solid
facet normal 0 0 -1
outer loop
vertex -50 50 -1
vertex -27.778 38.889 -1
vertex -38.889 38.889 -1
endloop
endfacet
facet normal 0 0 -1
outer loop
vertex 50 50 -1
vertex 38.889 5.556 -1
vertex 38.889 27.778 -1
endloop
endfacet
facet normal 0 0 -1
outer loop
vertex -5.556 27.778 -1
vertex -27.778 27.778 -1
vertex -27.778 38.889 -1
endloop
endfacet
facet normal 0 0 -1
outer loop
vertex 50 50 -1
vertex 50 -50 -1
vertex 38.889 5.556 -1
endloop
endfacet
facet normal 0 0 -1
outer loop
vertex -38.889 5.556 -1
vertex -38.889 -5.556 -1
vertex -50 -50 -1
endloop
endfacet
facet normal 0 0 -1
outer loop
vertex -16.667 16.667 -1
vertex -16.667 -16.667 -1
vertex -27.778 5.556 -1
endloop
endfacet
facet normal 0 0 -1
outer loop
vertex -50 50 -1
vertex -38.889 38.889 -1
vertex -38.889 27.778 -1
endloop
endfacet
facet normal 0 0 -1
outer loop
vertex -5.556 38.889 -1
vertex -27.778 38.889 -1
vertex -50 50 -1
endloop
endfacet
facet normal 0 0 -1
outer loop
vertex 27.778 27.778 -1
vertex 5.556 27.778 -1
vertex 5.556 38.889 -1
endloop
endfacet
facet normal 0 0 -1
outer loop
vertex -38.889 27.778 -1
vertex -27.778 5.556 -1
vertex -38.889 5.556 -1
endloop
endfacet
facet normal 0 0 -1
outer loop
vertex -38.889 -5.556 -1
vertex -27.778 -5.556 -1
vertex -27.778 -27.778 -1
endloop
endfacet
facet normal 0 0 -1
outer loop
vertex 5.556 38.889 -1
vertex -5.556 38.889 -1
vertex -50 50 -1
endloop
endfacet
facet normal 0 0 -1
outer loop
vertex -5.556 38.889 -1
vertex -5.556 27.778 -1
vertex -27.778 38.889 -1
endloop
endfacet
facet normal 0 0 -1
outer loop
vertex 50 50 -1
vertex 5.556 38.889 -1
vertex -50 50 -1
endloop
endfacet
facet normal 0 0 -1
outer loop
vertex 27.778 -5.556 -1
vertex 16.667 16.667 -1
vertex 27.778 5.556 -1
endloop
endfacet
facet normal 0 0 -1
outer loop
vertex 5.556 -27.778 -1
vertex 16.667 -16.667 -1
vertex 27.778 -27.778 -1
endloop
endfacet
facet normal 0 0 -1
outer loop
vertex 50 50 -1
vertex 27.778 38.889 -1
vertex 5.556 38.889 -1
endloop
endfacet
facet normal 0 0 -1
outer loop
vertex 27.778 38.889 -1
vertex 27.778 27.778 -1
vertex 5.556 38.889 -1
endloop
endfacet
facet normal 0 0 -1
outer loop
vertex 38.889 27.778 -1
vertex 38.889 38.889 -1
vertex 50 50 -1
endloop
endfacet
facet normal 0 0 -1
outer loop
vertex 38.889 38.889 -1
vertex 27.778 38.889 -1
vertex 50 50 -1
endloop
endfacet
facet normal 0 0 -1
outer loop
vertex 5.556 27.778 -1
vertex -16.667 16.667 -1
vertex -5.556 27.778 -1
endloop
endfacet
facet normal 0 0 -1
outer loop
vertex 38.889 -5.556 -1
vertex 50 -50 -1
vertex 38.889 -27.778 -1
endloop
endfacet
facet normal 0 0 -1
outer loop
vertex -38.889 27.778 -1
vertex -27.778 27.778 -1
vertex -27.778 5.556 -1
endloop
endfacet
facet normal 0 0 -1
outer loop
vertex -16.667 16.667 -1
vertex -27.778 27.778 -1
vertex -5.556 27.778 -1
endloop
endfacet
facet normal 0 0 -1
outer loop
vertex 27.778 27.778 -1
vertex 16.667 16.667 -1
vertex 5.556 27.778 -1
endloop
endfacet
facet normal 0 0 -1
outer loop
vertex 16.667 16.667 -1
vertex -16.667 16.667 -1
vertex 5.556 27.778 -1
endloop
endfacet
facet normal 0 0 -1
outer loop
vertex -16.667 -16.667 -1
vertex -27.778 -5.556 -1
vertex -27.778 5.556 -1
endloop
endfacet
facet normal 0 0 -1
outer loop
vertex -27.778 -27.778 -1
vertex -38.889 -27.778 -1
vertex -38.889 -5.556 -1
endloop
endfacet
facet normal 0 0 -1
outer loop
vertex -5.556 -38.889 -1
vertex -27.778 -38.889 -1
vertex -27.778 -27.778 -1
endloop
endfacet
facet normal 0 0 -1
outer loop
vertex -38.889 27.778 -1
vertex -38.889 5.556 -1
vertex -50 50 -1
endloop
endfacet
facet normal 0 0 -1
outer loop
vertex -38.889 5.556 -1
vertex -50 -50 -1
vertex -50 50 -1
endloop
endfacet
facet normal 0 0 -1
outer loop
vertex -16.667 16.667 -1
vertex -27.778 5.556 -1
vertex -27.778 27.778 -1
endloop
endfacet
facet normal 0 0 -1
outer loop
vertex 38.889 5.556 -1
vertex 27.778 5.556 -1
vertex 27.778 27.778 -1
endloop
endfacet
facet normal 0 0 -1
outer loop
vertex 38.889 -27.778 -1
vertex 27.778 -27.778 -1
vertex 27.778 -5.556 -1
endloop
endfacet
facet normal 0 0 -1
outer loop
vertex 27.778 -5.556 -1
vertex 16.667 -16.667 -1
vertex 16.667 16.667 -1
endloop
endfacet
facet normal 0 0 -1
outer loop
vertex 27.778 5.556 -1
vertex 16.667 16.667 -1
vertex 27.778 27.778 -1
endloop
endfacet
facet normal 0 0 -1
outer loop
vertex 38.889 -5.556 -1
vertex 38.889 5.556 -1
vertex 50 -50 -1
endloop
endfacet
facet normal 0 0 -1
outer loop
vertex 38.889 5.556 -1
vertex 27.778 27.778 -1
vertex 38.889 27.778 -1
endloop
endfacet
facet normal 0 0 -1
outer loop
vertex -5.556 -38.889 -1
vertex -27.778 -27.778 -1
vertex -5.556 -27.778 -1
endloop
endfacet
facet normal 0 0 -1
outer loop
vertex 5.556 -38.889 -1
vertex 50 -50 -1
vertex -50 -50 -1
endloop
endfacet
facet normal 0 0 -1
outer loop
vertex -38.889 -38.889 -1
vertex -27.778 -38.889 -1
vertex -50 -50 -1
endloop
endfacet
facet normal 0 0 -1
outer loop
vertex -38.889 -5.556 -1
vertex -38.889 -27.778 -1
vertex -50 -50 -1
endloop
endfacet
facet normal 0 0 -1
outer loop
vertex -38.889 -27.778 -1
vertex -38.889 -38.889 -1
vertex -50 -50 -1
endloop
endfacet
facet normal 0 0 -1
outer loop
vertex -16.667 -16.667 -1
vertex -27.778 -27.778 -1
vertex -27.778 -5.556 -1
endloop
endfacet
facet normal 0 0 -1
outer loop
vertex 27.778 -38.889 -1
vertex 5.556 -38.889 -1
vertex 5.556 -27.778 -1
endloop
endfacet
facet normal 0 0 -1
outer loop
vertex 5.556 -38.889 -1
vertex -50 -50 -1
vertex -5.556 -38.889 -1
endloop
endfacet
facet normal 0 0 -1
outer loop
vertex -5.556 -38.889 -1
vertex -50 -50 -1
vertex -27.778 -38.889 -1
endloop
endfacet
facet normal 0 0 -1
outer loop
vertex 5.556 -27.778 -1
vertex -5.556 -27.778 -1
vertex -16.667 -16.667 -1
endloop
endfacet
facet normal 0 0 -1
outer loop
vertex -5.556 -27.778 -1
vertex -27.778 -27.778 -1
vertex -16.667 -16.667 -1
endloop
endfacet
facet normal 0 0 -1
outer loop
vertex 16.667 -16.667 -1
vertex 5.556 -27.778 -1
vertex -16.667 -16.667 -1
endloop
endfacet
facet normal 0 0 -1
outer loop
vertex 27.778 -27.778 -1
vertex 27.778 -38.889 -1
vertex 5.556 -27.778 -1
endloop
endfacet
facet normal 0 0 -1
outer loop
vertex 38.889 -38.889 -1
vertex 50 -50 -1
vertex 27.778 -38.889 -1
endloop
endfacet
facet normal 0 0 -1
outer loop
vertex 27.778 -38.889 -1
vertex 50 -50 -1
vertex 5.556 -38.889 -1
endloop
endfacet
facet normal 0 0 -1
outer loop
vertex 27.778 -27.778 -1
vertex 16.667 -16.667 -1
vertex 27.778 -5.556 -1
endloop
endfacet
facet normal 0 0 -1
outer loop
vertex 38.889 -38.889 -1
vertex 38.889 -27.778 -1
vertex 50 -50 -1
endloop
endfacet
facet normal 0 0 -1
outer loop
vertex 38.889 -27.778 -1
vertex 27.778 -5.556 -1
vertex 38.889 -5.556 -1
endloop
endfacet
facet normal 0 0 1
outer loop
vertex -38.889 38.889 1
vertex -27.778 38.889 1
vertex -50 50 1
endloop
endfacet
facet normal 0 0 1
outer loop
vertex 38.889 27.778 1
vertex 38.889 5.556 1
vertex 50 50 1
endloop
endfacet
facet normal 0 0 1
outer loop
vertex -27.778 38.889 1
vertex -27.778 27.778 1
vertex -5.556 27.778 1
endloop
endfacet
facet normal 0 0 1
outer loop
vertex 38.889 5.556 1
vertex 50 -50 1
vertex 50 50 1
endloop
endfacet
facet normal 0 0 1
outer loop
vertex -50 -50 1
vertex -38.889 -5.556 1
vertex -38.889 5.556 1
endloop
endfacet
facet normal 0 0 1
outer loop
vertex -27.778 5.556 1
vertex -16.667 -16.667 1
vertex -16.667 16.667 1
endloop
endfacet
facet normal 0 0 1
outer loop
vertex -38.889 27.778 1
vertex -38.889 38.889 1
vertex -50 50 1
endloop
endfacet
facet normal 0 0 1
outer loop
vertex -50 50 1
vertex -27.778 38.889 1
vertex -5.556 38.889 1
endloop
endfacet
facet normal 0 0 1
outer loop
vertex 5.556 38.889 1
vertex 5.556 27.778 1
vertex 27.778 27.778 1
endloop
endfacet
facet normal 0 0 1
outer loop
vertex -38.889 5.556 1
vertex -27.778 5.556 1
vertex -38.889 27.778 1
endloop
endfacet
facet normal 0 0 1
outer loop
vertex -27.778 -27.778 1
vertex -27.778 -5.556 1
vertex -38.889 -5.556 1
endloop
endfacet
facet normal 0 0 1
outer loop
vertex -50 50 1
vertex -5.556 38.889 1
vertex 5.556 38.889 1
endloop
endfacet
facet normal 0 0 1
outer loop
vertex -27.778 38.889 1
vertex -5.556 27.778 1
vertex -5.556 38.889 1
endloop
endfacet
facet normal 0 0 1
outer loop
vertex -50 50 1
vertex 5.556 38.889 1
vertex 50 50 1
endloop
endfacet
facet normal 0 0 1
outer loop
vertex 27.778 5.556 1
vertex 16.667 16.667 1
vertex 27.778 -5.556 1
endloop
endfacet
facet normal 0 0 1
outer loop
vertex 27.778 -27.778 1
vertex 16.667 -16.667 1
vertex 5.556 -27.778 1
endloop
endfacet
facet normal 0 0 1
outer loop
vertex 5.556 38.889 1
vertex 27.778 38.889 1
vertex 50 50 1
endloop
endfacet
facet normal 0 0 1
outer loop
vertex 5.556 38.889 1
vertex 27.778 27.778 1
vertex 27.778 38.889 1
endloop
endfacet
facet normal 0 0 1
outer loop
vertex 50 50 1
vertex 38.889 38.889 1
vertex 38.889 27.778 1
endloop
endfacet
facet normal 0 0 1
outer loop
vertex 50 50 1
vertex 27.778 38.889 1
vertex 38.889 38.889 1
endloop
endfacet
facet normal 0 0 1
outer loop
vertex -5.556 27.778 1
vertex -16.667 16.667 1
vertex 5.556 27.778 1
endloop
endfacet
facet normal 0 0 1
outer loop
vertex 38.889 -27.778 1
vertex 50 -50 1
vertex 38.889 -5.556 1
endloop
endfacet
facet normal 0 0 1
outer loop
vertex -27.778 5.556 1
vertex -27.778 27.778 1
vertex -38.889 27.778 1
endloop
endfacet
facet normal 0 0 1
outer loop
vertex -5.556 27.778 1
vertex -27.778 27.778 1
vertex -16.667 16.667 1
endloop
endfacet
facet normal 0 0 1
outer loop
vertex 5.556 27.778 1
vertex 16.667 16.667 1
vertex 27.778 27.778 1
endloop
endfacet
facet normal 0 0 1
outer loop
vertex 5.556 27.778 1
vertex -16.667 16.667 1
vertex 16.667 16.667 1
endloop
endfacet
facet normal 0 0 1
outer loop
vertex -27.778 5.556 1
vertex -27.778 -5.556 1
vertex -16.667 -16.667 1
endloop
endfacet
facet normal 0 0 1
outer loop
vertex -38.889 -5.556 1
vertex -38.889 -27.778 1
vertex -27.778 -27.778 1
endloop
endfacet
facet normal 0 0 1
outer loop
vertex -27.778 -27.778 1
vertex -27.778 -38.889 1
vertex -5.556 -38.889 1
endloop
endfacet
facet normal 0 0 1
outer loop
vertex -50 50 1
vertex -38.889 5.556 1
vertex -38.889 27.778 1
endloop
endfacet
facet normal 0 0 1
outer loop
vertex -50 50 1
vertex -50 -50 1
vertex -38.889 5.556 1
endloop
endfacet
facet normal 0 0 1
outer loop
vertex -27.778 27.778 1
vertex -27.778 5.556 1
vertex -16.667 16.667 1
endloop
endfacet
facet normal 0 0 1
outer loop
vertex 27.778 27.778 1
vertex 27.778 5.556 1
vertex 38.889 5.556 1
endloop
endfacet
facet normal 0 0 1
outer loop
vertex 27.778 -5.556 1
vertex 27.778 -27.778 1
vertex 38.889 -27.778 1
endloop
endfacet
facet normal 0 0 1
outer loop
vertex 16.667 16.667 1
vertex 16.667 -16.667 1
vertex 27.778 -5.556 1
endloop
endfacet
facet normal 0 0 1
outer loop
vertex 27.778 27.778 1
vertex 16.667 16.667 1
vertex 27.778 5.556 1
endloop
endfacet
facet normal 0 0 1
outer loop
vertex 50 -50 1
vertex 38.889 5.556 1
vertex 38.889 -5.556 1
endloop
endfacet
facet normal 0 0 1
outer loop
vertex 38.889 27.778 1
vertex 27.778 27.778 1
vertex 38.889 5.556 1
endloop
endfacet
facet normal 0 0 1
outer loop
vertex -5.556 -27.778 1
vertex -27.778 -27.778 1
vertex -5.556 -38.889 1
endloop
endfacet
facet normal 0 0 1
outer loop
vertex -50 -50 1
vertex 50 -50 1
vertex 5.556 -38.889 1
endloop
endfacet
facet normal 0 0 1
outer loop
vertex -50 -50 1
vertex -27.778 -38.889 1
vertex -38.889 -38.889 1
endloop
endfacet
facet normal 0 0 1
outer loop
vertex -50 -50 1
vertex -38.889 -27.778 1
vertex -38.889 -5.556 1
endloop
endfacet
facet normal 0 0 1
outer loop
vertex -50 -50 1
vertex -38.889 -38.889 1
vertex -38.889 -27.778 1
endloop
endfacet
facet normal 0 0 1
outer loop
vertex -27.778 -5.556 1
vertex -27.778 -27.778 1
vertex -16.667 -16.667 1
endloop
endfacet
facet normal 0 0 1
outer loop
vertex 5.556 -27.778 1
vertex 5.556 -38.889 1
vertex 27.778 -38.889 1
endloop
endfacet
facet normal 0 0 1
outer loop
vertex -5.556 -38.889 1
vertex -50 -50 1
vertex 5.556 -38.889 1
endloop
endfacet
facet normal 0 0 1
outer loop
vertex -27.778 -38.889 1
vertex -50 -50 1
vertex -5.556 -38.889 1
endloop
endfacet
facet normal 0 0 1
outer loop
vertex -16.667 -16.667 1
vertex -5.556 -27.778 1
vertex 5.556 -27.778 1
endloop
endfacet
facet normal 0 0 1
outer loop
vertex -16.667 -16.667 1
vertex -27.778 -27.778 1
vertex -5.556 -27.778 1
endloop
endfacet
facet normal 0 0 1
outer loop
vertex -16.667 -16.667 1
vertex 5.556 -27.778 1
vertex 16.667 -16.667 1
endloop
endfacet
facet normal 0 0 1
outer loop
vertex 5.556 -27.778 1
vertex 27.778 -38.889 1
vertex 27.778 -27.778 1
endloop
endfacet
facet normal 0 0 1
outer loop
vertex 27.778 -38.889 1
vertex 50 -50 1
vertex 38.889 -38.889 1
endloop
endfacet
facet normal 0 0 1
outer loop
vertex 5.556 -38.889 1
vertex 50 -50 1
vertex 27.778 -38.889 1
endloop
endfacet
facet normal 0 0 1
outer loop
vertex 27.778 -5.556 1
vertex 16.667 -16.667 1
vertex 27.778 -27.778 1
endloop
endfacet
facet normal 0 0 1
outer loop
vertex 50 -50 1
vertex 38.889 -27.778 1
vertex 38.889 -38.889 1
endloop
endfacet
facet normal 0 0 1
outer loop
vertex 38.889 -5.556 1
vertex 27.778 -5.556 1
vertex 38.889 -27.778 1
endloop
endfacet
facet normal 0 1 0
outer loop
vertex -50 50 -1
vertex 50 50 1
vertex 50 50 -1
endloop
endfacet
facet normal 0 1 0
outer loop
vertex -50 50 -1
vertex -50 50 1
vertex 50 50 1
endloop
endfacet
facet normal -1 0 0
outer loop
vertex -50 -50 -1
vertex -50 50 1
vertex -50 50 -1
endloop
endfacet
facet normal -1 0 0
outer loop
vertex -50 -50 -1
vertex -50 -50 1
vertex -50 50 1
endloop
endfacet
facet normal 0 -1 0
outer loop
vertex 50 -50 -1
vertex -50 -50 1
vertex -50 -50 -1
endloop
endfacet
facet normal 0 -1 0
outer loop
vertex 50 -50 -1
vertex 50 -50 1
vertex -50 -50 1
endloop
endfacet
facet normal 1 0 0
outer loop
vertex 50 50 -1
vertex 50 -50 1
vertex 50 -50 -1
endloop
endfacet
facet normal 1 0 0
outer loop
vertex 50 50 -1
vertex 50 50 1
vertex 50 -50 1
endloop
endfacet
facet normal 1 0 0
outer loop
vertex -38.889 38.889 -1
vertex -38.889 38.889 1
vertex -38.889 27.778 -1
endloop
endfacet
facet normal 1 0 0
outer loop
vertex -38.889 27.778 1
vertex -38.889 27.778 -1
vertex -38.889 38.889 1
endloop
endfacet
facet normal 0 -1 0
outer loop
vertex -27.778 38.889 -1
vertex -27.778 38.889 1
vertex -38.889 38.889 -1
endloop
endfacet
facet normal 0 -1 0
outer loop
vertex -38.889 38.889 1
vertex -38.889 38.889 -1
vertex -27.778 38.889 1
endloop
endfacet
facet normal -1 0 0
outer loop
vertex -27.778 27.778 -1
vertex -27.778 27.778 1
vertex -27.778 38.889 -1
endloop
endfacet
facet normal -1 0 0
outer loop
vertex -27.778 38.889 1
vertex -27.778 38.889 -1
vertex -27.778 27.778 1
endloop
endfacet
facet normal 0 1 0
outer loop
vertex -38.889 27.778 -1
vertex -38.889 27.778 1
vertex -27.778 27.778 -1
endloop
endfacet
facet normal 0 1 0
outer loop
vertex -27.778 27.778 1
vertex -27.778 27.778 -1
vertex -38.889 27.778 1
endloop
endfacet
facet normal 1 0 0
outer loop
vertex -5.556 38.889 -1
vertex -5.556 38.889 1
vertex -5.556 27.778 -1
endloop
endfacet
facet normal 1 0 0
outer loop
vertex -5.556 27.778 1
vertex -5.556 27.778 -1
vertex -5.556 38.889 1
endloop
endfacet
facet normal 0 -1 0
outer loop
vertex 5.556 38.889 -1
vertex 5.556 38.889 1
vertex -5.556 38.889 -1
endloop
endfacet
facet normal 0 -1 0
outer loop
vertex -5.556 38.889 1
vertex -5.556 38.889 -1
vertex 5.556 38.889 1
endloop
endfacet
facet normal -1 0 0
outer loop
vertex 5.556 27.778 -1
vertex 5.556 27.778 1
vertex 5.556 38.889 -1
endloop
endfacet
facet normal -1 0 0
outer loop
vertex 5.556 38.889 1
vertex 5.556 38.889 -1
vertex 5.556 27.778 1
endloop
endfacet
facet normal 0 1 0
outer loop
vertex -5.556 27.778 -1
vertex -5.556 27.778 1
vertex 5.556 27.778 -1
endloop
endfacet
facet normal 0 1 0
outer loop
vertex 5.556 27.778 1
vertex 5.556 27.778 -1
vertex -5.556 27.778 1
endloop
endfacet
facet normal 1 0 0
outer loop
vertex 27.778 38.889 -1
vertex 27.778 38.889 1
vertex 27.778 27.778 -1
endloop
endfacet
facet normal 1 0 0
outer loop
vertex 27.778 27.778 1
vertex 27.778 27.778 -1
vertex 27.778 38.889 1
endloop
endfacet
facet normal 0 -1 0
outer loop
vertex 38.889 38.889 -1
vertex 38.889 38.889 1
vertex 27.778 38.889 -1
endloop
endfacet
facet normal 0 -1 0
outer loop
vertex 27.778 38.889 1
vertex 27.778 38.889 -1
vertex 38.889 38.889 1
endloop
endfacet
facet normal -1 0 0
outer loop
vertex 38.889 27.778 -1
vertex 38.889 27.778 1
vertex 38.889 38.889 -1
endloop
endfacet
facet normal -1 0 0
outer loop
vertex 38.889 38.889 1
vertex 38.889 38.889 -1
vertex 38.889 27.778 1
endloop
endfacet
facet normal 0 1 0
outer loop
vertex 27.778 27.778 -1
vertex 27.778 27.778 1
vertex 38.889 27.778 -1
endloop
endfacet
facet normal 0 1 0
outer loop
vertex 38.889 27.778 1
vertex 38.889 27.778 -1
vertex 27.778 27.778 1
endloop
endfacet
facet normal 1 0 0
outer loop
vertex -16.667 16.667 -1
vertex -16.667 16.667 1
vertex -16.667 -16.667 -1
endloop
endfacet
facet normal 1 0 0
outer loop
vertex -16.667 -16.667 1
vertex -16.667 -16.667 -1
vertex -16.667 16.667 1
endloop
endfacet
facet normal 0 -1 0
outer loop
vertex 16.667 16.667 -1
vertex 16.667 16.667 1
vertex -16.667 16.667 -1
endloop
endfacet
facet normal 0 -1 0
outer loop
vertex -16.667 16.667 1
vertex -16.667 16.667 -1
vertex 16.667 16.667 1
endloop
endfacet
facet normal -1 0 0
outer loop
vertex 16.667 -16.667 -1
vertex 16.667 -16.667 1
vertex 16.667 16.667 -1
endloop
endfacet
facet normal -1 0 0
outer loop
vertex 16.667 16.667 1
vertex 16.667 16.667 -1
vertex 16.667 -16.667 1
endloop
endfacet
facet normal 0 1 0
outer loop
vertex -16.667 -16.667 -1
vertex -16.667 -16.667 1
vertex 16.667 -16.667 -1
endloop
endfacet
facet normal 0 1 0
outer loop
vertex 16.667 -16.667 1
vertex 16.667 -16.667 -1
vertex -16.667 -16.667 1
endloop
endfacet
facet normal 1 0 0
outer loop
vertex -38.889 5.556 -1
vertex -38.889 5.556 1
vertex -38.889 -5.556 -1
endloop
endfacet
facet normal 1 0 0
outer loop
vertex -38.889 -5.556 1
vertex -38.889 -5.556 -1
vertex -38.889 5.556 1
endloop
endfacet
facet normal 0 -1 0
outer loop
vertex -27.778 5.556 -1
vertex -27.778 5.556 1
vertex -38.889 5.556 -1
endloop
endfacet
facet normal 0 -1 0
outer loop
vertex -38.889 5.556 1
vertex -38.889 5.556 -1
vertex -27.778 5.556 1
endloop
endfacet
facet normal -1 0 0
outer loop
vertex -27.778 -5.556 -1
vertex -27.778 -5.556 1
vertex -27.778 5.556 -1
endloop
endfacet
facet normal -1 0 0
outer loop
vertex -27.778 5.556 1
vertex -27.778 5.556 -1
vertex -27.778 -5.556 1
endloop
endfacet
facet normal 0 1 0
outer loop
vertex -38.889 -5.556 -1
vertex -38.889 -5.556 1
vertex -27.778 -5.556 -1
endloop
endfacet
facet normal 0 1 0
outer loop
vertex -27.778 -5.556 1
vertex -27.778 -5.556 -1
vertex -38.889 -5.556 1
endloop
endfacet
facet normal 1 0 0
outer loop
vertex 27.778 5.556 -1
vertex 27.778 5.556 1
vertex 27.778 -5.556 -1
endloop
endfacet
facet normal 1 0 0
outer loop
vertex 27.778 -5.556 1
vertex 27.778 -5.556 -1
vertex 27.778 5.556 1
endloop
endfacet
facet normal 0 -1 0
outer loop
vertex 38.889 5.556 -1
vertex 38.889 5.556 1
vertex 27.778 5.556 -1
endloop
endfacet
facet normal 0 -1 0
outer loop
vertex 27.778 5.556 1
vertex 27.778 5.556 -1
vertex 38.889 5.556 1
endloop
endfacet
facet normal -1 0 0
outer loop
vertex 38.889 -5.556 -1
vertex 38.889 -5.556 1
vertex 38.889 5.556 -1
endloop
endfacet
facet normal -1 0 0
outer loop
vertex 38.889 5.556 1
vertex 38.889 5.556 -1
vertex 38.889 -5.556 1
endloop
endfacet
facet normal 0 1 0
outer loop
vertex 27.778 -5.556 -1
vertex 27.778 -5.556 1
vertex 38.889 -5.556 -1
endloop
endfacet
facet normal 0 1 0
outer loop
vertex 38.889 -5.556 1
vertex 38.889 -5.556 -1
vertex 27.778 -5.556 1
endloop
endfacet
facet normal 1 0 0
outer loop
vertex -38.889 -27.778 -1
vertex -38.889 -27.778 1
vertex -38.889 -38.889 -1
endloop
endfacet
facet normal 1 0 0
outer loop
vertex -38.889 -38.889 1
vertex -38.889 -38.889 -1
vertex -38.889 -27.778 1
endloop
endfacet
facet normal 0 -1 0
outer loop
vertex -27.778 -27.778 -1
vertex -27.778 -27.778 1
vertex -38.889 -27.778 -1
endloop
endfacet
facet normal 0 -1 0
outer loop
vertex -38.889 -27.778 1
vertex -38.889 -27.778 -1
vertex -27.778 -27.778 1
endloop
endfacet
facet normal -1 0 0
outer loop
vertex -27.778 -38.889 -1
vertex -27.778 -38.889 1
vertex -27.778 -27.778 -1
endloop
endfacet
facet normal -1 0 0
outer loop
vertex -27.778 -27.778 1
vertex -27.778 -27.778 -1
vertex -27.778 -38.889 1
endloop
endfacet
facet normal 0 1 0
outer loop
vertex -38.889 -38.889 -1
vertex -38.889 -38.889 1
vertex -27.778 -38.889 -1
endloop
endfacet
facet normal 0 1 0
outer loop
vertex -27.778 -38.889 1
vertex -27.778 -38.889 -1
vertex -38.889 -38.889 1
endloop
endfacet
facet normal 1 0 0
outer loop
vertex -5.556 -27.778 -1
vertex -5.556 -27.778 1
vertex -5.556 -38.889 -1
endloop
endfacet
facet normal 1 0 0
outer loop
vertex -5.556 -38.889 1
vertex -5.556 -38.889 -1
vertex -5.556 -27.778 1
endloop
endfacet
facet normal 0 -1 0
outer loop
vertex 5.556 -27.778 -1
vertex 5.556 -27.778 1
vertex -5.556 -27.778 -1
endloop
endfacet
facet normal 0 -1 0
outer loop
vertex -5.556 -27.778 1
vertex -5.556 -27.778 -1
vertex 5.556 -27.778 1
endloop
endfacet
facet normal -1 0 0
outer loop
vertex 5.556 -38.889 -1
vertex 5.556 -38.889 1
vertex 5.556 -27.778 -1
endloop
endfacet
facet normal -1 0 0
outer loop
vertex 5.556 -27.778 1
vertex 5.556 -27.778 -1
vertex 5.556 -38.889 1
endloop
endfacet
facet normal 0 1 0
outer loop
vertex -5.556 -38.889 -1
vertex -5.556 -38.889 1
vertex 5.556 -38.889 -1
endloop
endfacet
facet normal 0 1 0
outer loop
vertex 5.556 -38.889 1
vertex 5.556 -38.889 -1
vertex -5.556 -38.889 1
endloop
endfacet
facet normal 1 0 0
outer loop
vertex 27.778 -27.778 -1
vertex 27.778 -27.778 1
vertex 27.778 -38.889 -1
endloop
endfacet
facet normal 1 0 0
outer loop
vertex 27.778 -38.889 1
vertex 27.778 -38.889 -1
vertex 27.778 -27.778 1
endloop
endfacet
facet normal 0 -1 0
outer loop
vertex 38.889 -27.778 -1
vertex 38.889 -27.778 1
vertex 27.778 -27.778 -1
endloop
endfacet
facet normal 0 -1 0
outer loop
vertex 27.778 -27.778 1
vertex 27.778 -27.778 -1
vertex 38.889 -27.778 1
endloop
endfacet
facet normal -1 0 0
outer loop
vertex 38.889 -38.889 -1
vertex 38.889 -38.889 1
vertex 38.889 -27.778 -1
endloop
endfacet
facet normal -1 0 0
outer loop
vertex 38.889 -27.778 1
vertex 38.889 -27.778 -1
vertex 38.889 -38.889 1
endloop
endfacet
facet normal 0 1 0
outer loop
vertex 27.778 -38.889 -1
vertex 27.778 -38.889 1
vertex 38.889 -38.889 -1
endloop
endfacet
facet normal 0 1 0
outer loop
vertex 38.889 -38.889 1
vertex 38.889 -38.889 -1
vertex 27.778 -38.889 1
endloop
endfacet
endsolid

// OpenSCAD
//Reliably renders up to a level 7 carpet in 2d, can extrude to 3d for stl creation but it gets a little slow at level 5 and up. Don't recomment trying to manipulate the view much at all once a large one is rendered

side = 100;


//level of fractal recursion
level = 2;

center = true;

//set extrude to true to render the carpet in 3D with a height of h (otherwise renders a 2d sheet that can be exported to DXF (displays with a false thickness of 1), which is faster and probably what you want)
extrude = true;
h = 2;

//adds a border to the edge of size h; for building overlapping squares with cube_it
border = false;

rend();
//cube_it();



module carpet(){
        s = side + (border ? 2*h:0);
        difference(){
            square(s);
            translate([(border ? h:0),(border ? h:0),0])cuts();
        }
}
module cuts(){
    for (i = [0:level]){
        w = side/pow(3,i);
        for (x = [1.5*w:3*w:side-w], y = [1.5*w:3*w:side-w]) {
          translate([x,y])square(w,center=true);
        }
    }
}

//makes a cube of 6 carpets
module cube_it(){
    disp = ((side+h)/2);
    rotate([90,0,0]){
    translate([0,0,disp])rend();
    translate([0,0,-disp])rend();
    }
    rotate([0,90,0]){
    translate([0,0,disp])rend();
    translate([0,0,-disp])rend();
    }
    translate([0,0,disp])rend();
    translate([0,0,-disp])rend();
    
}


module run(){
    if (extrude) linear_extrude(h, center = true)carpet();
    else carpet();
}


//renders a carpet
module rend(){
    if (center){
        translate([-side/2 - (border ? h:0),-side/2 - (border ? h:0),0])run();
    }
    else{
        run();
    }
}
